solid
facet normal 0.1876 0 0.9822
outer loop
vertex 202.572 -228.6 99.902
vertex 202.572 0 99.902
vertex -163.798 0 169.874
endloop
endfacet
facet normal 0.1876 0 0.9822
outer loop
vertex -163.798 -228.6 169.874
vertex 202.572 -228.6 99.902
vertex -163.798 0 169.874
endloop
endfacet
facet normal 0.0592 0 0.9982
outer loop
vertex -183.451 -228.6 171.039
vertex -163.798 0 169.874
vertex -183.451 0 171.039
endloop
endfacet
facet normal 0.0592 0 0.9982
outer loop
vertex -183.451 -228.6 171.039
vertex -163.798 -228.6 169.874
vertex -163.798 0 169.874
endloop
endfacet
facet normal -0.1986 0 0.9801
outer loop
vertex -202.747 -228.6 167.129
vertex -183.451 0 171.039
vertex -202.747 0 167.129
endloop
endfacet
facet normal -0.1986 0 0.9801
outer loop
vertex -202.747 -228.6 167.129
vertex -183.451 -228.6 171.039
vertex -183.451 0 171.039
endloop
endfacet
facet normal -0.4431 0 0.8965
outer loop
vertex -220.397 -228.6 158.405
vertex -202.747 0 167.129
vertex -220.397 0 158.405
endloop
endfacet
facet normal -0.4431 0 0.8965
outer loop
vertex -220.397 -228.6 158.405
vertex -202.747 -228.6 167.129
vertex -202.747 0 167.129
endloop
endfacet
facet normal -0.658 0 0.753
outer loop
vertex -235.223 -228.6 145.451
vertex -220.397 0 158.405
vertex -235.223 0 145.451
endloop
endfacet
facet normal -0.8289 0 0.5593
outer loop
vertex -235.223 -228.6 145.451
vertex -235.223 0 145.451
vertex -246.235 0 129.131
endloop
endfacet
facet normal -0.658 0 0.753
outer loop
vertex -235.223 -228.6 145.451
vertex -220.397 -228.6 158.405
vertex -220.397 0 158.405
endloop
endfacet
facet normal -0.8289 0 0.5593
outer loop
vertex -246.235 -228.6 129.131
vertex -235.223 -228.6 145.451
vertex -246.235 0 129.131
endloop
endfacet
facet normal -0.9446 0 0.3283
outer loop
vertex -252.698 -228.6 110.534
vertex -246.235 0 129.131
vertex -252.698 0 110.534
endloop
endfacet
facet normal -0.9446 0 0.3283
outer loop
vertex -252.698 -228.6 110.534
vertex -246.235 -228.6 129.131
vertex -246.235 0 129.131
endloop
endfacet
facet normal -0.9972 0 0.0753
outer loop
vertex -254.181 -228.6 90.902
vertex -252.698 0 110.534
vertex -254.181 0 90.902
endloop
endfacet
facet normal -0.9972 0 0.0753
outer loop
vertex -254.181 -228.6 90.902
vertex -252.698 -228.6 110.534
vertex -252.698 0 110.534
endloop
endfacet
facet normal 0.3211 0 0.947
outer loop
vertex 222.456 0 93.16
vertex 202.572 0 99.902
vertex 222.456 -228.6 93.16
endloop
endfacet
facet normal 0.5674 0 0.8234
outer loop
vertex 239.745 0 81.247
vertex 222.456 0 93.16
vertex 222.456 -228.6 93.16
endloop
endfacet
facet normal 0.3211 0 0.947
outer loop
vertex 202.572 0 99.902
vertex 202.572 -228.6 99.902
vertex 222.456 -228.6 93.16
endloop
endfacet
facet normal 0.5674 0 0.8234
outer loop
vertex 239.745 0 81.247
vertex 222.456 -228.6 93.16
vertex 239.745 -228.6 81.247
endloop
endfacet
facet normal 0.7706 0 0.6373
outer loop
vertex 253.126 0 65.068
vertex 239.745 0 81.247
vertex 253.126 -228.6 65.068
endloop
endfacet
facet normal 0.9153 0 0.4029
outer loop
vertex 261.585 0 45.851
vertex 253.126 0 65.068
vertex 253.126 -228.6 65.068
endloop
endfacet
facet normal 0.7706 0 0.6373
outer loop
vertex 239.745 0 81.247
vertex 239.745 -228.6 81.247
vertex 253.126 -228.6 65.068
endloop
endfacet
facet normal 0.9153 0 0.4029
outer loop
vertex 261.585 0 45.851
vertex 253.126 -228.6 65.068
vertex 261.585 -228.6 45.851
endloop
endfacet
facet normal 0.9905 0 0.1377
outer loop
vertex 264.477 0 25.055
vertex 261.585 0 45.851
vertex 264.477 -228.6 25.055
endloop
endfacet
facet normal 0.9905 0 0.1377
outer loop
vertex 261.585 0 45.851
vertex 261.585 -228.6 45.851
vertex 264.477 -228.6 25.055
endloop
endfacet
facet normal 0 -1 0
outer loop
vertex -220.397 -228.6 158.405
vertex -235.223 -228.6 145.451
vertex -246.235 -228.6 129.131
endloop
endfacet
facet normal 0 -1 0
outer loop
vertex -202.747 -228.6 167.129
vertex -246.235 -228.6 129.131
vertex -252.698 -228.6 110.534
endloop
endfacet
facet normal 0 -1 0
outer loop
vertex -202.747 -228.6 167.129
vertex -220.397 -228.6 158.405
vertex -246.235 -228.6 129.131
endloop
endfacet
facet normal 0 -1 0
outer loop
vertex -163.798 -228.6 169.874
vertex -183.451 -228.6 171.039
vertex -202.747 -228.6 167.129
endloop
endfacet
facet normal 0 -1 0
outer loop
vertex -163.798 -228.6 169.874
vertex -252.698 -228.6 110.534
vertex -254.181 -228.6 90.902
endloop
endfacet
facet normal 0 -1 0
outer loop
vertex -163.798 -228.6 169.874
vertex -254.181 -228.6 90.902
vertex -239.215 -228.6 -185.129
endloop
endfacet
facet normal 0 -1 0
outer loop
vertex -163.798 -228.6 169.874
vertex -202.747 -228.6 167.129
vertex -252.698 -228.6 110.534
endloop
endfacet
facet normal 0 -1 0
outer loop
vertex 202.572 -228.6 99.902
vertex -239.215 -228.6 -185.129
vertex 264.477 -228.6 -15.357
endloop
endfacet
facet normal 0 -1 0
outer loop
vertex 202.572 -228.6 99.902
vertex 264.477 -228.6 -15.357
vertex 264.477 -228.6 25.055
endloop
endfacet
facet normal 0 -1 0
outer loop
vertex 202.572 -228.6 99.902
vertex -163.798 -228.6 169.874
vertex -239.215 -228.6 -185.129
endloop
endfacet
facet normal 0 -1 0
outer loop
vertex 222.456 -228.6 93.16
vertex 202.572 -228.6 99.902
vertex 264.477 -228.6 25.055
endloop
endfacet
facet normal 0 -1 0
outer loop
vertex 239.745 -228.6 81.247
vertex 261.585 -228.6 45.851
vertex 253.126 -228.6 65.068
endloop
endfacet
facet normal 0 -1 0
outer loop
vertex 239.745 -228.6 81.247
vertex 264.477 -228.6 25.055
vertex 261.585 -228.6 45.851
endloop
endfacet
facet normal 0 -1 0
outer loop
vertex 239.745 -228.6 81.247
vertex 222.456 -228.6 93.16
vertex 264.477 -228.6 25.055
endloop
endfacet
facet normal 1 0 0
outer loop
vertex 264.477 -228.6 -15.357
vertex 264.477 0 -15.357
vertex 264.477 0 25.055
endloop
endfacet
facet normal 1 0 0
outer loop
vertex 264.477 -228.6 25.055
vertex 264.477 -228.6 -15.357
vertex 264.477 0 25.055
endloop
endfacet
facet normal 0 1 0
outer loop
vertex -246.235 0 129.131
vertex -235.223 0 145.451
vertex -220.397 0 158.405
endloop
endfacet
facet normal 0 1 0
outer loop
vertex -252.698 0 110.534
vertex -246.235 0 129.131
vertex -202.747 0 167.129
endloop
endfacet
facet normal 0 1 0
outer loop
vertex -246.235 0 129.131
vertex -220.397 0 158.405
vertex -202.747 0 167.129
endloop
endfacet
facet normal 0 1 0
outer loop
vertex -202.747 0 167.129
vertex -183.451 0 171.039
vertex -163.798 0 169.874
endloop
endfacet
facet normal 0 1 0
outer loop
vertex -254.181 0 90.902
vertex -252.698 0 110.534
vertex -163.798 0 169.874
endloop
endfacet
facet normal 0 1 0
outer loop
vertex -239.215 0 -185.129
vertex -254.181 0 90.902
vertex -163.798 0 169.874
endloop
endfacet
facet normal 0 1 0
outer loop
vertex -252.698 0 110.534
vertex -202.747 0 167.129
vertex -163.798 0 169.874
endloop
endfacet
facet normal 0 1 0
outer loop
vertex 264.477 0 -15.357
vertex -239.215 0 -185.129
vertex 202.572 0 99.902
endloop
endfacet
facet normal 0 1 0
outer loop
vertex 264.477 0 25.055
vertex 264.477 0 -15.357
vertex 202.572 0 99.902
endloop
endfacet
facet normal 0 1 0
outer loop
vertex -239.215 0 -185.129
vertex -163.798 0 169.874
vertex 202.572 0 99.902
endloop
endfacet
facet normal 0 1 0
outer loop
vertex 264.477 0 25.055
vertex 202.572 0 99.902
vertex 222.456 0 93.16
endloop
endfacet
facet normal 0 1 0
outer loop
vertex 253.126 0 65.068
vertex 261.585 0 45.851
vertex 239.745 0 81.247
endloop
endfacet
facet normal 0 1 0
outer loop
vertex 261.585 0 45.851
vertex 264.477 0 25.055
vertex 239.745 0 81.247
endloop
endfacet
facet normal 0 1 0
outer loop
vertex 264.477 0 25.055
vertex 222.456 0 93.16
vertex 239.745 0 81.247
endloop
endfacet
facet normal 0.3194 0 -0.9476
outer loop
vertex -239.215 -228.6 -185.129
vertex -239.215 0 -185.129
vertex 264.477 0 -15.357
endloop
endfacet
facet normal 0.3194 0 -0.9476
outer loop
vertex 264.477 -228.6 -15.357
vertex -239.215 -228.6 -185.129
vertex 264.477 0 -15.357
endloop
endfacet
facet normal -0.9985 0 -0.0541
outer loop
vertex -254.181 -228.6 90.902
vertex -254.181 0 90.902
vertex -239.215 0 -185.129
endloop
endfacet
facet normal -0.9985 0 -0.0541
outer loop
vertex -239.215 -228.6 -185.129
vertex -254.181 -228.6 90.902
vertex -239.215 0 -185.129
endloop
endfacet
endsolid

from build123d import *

# Parameters (mm, degrees)
F1_DEPTH = 228.6
F2_R     = 76.2


with BuildPart() as f1:
    # F0 (on Front) → F1 (new body)
    with BuildSketch(Plane.XZ):
        Polygon((264.477155, 88.079405), (-259.452972, 188.143295), (-239.215332, -185.128794), (264.477155, -15.357443), align=None)
    extrude(amount=F1_DEPTH)

    # F2
    f2_edges = [f1.edges().sort_by_distance(p)[0] for p in [
        (-259.452972, -114.3, 188.143295),
        (264.477155, -114.3, 88.079405),
    ]]
    fillet(f2_edges, radius=F2_R)


solid = f1.part
